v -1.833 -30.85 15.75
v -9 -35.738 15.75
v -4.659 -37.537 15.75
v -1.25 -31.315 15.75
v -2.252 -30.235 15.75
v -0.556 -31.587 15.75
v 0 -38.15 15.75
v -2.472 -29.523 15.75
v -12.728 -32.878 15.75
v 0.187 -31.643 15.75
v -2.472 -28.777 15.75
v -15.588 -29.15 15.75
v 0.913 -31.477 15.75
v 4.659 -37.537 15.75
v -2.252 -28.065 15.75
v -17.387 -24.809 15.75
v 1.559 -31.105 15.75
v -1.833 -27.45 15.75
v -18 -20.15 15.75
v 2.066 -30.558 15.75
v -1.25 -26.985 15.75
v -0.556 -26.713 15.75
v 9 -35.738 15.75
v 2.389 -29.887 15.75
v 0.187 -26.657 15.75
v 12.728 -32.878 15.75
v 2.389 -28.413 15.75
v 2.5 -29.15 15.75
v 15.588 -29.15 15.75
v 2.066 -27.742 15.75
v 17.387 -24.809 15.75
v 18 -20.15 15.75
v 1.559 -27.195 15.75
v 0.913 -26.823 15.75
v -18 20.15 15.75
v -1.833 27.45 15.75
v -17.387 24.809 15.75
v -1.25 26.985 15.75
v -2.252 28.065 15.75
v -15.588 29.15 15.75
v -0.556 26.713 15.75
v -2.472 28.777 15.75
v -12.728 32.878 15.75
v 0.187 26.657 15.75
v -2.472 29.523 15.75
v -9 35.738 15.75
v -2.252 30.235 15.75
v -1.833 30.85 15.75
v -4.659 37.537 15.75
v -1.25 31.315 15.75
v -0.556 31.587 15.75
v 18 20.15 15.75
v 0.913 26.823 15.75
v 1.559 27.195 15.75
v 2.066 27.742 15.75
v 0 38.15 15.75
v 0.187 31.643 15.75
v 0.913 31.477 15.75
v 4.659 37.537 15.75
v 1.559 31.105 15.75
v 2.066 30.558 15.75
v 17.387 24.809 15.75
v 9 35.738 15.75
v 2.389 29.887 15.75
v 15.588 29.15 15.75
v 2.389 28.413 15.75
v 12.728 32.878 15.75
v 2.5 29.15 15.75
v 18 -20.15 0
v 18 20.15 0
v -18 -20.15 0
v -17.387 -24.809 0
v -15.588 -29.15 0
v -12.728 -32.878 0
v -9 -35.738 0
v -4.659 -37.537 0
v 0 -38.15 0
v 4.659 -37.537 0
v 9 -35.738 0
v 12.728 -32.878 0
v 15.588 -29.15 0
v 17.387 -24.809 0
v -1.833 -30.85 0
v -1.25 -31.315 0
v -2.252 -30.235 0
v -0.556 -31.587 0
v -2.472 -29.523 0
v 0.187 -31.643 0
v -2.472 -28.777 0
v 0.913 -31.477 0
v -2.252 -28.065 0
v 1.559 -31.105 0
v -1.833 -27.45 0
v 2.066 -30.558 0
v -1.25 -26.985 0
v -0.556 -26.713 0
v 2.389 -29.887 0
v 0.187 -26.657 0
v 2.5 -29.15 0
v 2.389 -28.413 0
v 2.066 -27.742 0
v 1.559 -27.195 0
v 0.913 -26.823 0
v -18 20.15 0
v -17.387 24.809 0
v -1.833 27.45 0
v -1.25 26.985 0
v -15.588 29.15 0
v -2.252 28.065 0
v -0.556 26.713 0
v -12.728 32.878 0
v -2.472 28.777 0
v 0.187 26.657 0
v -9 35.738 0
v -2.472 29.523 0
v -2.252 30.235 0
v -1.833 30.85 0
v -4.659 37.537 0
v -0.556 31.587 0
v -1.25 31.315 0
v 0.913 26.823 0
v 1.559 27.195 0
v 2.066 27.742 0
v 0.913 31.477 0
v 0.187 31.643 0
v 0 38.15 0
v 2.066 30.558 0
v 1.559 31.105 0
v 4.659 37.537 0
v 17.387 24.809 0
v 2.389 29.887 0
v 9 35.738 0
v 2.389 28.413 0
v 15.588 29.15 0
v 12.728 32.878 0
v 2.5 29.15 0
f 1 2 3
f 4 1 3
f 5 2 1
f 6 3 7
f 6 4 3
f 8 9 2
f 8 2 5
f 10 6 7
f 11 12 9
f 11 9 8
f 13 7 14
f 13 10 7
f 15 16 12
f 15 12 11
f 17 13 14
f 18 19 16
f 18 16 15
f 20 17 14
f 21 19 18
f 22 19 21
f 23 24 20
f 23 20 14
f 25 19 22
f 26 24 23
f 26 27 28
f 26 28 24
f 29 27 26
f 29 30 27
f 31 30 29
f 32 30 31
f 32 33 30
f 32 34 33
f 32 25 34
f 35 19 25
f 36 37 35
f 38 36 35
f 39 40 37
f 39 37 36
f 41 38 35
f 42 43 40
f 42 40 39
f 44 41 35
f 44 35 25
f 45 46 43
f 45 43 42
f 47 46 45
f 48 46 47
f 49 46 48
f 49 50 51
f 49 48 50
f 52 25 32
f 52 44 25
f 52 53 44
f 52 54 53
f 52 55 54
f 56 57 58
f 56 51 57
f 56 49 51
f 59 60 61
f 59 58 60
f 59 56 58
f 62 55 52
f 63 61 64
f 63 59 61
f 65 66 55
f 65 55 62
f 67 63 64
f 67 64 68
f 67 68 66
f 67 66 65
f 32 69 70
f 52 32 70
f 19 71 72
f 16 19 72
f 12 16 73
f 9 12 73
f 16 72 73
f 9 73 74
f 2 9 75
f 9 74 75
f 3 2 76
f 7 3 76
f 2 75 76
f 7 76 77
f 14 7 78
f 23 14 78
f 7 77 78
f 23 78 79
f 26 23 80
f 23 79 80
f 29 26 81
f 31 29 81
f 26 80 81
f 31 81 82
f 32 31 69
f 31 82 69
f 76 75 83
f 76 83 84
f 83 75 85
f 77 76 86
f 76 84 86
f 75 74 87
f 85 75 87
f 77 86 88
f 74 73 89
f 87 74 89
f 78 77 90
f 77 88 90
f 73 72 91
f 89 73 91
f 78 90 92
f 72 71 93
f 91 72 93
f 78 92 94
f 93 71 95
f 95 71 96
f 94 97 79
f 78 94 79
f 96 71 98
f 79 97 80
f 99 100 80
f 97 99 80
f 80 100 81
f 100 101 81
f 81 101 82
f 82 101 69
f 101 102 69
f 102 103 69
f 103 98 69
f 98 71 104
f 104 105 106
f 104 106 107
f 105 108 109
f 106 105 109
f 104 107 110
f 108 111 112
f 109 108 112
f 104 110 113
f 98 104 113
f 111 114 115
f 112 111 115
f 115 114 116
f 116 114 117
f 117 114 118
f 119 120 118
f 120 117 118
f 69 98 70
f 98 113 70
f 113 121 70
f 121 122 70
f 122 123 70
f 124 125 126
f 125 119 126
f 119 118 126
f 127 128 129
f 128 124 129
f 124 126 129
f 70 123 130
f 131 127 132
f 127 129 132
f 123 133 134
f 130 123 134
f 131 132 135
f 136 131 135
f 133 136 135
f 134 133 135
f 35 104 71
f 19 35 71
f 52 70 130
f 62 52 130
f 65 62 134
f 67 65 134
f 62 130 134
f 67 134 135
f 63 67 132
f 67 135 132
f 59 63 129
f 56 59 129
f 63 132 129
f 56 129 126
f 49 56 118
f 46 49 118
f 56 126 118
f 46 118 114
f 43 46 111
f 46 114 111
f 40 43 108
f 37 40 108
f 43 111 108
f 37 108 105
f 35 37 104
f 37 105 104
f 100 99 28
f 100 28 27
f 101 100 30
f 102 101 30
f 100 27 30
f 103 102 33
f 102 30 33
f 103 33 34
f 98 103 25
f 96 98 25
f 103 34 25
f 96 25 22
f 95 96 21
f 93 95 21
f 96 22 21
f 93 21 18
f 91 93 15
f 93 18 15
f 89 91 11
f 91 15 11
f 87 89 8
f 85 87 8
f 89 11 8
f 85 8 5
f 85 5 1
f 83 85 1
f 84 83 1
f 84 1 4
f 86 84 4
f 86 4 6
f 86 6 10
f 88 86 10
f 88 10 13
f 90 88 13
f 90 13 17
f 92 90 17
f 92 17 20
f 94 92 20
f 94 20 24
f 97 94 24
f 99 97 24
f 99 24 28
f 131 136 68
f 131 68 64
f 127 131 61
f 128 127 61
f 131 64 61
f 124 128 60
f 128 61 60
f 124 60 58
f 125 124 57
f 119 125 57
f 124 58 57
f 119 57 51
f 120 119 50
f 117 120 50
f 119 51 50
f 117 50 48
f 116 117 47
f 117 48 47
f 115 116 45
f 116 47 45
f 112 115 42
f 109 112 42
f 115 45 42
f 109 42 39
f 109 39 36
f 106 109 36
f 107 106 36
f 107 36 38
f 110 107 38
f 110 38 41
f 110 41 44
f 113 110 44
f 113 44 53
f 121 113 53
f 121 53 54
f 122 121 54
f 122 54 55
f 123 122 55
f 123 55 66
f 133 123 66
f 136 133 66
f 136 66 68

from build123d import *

# Parameters (mm, degrees)
F1_DEPTH = 15.75
F2_R     = 2.5
F3_DEPTH = 15.751


with BuildPart() as f1:
    # F0 (on Top) → F1 (new body)
    with BuildSketch(Plane.XY):
        with BuildLine():
            ThreePointArc((18, 20.15), (0, 38.15), (-18, 20.15))
            Line((-18, 20.15), (-18, -20.15))
            ThreePointArc((-18, -20.15), (0, -38.15), (18, -20.15))
            Line((18, -20.15), (18, 20.15))
        make_face()
    extrude(amount=F1_DEPTH)

    # F2 (on face) → F3 (cut, through all)
    with BuildSketch(Plane.XY.offset(15.75)):
        with Locations((0, 29.15)):
            Circle(F2_R)
        with Locations((0, -29.15)):
            Circle(F2_R)
    extrude(amount=-F3_DEPTH, mode=Mode.SUBTRACT)


solid = f1.part
